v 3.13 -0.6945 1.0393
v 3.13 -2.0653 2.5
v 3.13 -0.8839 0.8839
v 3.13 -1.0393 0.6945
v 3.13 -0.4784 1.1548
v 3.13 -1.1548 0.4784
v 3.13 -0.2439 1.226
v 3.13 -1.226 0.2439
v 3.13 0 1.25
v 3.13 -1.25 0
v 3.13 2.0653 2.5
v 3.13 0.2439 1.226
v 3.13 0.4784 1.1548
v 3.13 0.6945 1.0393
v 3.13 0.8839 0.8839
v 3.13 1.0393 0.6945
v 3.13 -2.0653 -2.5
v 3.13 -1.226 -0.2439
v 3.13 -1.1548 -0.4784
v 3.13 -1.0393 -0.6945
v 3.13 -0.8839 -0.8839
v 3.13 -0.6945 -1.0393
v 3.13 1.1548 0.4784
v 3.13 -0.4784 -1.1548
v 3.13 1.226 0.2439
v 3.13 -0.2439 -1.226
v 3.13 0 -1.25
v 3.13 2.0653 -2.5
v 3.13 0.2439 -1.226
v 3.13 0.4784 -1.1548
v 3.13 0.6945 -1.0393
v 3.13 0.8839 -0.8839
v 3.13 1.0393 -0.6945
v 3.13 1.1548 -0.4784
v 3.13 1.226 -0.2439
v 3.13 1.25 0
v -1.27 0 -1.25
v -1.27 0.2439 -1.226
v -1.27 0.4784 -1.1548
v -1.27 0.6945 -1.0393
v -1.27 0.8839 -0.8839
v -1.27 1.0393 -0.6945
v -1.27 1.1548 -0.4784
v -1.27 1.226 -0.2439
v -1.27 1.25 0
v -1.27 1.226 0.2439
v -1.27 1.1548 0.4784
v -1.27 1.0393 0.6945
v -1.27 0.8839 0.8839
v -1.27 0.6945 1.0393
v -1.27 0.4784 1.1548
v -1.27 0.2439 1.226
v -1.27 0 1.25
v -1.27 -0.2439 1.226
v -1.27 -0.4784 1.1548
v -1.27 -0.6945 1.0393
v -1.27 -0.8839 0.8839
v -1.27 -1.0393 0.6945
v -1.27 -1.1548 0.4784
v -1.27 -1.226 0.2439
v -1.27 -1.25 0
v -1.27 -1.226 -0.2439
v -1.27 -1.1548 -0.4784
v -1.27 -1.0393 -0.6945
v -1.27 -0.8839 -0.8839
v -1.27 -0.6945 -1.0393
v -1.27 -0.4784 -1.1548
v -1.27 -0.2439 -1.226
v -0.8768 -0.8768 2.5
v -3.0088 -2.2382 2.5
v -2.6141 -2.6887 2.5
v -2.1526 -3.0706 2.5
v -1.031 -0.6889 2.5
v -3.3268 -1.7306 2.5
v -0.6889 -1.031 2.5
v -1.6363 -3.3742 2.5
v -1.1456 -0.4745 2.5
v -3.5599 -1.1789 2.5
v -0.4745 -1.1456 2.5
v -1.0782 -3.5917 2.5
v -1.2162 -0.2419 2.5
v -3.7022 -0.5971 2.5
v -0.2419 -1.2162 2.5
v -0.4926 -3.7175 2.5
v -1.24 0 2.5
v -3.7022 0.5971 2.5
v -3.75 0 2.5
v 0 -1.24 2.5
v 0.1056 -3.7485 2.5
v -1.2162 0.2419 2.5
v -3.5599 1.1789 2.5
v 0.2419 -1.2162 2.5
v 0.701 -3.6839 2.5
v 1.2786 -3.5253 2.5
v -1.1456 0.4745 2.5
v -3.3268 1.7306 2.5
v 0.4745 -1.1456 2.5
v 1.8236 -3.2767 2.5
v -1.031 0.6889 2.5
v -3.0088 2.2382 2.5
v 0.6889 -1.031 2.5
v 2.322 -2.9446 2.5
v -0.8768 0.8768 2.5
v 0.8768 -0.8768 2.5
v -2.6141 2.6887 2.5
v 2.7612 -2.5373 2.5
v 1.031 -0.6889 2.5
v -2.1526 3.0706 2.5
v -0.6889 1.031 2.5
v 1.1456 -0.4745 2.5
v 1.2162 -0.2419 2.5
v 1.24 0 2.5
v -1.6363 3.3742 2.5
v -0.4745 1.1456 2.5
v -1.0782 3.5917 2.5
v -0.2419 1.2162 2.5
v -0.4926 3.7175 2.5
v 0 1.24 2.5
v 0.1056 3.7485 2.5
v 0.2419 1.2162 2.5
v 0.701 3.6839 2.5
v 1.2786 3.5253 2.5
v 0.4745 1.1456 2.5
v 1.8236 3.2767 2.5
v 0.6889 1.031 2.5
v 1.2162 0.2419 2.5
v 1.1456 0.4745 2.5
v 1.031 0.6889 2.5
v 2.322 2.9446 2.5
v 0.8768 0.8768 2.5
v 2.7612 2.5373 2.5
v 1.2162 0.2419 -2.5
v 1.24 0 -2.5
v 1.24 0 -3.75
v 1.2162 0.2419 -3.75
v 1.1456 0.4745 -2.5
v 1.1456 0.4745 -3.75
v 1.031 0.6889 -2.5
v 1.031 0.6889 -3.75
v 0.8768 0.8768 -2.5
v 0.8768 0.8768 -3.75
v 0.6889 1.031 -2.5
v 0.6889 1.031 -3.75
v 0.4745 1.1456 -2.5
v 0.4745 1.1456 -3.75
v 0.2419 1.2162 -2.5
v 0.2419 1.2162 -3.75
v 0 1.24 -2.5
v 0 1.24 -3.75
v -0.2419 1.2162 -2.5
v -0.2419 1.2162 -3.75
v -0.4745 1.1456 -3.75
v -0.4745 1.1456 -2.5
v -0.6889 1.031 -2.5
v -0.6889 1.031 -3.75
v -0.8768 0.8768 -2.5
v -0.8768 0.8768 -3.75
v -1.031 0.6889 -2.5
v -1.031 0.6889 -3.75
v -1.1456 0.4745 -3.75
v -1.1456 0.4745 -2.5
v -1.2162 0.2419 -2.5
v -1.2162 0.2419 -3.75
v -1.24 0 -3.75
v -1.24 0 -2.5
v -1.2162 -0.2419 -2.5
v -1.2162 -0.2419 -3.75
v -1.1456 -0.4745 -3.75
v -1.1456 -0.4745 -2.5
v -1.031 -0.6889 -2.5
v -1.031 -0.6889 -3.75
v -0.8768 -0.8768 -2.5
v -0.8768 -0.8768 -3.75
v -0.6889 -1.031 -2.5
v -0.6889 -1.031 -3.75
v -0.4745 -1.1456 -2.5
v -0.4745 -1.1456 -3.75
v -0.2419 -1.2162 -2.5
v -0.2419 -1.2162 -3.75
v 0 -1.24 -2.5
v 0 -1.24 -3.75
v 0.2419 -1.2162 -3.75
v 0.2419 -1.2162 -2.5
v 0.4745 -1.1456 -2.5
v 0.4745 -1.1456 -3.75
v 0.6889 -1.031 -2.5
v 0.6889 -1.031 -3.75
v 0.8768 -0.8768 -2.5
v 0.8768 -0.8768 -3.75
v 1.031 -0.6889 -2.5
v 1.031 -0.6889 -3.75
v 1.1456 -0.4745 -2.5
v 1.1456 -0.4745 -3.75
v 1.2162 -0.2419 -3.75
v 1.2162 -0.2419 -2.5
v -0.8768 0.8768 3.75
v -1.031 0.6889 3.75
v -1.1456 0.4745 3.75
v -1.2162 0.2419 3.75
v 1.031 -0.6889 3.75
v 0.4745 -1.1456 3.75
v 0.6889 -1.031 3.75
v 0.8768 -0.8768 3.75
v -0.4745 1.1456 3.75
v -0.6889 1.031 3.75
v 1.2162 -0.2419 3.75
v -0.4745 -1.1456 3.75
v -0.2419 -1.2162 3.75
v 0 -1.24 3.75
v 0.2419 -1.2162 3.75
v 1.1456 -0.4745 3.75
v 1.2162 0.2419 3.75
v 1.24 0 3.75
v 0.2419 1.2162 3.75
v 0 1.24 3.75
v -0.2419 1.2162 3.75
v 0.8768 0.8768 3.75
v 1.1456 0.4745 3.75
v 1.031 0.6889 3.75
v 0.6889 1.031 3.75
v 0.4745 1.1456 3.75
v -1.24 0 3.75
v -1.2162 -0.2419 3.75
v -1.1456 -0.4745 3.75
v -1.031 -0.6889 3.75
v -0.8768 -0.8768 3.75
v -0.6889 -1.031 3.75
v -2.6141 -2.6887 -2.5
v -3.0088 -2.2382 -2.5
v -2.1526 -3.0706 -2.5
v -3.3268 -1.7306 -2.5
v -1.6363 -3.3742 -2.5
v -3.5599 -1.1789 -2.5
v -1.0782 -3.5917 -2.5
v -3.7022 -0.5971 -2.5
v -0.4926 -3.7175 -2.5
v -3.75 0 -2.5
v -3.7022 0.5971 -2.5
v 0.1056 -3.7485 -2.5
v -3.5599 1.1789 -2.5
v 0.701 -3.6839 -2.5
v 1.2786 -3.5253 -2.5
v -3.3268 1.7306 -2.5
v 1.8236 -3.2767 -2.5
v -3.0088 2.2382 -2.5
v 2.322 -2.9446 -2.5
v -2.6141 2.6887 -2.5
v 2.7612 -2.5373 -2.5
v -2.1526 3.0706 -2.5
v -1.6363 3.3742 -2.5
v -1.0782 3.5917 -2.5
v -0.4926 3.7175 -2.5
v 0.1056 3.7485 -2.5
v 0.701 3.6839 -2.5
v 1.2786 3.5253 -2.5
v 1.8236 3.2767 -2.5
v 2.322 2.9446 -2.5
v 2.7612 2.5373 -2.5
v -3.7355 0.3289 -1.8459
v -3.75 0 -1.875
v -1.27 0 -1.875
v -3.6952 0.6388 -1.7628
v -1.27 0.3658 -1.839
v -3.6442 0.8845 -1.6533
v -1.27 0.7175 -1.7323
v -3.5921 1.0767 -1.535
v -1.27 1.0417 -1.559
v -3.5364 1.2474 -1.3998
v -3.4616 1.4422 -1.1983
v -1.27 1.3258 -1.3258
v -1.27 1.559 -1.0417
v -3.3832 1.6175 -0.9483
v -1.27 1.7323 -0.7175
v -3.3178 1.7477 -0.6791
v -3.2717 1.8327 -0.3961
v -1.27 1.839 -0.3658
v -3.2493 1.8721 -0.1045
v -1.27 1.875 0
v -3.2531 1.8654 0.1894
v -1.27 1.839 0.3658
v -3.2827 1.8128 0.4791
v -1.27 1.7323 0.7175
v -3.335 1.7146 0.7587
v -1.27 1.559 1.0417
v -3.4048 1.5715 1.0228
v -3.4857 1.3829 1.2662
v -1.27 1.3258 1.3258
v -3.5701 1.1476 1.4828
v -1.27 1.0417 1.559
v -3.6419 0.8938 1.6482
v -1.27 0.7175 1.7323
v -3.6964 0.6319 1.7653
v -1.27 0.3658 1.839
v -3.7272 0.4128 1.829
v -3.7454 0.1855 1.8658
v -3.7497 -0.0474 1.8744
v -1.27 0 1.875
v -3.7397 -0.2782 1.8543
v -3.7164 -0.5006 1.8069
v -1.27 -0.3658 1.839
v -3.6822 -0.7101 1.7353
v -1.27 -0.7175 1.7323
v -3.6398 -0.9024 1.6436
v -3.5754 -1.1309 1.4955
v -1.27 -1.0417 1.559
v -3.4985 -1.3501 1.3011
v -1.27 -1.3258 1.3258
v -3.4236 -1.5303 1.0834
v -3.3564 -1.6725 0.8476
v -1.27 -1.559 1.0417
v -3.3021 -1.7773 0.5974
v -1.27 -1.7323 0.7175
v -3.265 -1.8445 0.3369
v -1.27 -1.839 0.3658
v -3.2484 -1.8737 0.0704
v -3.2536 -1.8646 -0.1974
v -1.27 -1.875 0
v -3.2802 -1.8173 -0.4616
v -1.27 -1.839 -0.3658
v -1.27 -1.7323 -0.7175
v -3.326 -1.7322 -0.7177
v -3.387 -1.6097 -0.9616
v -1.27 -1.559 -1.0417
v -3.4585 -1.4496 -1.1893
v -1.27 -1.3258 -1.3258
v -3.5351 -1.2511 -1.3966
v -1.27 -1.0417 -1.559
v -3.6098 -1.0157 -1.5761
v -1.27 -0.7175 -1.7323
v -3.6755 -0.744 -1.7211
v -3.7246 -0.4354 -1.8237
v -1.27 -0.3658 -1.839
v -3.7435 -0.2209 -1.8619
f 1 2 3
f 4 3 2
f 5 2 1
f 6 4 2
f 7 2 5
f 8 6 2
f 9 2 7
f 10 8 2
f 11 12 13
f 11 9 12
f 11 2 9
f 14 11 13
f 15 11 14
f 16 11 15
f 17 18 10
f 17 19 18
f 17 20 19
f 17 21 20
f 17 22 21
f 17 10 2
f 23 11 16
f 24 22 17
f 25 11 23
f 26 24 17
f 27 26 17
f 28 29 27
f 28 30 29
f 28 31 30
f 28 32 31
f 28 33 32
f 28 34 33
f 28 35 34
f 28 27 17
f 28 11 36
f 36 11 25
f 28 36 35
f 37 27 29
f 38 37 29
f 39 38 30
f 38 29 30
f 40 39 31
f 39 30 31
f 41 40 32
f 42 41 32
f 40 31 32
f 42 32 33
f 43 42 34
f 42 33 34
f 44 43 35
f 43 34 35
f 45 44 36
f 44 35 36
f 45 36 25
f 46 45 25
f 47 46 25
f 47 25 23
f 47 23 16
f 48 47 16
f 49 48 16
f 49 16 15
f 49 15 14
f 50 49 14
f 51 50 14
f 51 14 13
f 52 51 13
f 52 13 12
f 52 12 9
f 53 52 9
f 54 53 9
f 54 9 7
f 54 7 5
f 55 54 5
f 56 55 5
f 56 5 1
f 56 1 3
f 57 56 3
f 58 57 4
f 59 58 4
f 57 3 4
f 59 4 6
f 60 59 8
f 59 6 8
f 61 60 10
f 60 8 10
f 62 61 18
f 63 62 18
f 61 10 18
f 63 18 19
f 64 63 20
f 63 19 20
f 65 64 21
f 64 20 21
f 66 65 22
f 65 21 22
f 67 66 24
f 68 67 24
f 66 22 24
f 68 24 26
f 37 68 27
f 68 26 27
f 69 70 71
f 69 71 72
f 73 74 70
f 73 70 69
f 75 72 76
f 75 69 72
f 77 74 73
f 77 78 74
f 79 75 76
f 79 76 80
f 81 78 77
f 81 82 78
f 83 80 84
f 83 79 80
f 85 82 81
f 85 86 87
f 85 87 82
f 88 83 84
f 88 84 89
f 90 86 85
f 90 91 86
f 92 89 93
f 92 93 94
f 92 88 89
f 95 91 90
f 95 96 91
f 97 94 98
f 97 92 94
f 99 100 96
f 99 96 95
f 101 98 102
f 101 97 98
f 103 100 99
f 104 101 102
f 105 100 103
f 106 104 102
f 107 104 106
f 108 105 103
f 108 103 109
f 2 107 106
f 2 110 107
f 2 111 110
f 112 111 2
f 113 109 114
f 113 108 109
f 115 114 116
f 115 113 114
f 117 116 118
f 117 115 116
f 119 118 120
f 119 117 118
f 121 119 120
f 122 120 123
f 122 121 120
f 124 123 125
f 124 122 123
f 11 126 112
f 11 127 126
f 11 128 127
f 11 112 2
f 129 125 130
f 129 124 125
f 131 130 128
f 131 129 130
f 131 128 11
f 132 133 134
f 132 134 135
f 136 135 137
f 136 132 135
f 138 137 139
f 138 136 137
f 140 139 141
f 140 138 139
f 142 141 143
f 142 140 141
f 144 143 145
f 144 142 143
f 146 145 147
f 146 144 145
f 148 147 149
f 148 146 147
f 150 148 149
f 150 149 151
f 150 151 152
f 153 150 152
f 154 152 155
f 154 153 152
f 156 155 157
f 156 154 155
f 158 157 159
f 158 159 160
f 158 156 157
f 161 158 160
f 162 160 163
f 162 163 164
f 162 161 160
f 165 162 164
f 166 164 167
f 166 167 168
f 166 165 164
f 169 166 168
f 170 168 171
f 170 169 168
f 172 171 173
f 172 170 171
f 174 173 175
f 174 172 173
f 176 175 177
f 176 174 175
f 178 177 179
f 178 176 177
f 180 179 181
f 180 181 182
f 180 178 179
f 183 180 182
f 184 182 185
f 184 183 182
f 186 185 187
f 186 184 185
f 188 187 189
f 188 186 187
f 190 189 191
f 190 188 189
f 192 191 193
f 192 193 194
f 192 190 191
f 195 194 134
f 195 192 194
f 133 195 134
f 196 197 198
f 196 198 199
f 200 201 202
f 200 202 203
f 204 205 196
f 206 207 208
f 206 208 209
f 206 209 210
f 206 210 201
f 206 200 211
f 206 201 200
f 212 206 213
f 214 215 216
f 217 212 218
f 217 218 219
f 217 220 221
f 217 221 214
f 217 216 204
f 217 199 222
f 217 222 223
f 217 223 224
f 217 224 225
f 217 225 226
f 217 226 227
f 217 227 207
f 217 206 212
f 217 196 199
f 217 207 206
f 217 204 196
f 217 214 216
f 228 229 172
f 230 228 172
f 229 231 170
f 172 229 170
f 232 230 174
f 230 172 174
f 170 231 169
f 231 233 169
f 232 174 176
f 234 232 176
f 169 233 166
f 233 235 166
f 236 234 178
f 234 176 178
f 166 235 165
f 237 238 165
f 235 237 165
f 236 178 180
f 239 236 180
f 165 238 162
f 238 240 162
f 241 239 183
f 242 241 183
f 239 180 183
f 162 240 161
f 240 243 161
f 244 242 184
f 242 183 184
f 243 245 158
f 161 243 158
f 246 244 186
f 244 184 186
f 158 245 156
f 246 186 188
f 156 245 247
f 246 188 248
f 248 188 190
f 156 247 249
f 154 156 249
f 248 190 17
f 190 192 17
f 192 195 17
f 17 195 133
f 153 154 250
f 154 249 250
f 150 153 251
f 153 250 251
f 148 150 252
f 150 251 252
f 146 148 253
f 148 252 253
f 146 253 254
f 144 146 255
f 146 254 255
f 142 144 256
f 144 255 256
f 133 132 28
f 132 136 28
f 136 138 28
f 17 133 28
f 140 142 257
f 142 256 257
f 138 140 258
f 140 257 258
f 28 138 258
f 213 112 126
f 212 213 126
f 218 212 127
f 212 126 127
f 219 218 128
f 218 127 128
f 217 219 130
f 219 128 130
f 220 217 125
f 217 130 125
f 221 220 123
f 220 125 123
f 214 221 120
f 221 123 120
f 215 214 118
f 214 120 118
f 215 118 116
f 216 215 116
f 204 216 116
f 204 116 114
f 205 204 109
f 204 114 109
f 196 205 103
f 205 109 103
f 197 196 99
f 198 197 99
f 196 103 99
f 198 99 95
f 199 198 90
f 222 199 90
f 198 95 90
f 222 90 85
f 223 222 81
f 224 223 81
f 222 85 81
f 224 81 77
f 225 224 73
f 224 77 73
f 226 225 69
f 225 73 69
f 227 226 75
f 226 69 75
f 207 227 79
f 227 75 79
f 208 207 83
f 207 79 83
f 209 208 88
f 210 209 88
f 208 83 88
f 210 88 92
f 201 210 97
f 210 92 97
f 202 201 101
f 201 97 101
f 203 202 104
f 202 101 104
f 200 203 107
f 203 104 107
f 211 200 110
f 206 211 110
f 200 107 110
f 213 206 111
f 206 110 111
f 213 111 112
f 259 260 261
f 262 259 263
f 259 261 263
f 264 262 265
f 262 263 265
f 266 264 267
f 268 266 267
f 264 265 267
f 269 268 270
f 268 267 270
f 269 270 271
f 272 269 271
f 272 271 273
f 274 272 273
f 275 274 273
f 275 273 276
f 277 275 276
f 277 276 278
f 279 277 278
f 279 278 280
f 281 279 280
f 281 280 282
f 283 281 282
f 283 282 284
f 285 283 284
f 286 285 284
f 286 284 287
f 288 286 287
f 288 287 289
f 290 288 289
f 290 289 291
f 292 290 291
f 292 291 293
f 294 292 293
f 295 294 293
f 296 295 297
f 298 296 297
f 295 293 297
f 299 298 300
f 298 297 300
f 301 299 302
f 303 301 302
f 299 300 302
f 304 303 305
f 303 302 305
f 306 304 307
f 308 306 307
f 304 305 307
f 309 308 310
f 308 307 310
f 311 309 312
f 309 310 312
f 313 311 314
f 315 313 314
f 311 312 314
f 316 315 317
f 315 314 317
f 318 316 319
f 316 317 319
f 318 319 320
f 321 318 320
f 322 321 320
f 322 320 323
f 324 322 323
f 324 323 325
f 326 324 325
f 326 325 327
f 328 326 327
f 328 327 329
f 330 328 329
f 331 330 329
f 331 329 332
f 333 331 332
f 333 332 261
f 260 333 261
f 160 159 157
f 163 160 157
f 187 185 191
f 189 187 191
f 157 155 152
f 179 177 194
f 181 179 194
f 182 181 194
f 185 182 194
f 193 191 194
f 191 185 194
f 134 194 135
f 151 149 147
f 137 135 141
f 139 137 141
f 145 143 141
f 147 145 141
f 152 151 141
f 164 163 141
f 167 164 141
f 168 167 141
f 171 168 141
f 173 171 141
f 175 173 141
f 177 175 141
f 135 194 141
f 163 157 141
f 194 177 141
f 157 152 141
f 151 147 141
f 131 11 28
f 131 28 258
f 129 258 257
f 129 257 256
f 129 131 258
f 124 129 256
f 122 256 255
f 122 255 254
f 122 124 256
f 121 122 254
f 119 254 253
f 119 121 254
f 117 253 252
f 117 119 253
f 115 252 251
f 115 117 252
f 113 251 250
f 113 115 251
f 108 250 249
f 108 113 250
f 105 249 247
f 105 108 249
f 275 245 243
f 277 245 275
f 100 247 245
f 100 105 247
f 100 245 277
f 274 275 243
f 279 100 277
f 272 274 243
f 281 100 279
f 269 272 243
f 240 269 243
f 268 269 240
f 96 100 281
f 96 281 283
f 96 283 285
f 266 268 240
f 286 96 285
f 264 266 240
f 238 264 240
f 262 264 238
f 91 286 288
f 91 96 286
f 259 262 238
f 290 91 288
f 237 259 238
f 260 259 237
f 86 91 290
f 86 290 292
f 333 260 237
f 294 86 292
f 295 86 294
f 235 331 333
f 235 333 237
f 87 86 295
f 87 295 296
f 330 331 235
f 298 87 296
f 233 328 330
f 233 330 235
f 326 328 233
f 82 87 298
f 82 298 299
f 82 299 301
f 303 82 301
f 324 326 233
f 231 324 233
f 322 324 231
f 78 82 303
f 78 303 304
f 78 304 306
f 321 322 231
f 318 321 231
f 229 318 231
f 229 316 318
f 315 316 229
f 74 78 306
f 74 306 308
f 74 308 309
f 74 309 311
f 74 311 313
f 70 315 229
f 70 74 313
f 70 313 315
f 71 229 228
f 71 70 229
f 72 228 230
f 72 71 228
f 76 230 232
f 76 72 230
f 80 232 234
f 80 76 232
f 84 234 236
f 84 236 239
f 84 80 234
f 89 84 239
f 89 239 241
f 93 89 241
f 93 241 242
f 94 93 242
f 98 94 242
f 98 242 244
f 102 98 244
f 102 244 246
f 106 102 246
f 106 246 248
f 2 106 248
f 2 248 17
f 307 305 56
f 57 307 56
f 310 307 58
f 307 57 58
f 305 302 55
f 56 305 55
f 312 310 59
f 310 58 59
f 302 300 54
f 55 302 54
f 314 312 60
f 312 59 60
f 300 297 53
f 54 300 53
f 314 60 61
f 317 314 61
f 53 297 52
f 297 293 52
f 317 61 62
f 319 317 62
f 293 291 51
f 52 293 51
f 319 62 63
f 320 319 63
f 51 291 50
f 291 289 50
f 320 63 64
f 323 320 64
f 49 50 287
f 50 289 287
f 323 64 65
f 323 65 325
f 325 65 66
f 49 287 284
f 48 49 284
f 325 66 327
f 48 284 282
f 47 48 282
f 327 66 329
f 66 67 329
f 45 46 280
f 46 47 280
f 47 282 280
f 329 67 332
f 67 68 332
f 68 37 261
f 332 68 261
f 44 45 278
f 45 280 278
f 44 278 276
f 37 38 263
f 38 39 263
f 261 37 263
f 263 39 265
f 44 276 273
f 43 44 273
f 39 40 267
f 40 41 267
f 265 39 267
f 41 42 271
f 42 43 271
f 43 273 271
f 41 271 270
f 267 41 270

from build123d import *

# Parameters (mm, degrees)
BOSS_EXTRUDE1_DEPTH = 2.5
SKETCH4_R           = 1.24
BOSS_EXTRUDE2_DEPTH = 1.25
SKETCH5_R           = 1.25
CUT_EXTRUDE2_DEPTH  = 7.88
SKETCH7_R           = 1.875
CUT_EXTRUDE3_DEPTH  = 8.25
SKETCH8_R           = 1.875
BOSS_EXTRUDE3_DEPTH = 4.4
SKETCH5_3_R         = 1.25
CUT_EXTRUDE4_DEPTH  = 7.8800001


with BuildPart() as part:
    # Sketch3 → Boss-Extrude1 (new body, symmetric)
    with BuildSketch(Plane.XY):
        with BuildLine():
            Line((3.13, -2.065332903), (3.13, 2.065332903))
            ThreePointArc((3.13, 2.065332903), (-3.75, 0), (3.13, -2.065332903))
        make_face()
    extrude(amount=BOSS_EXTRUDE1_DEPTH, both=True)

    # Sketch4 → Boss-Extrude2 (add)
    with BuildSketch(Plane.XY.offset(2.5)):
        Circle(SKETCH4_R)
    boss_extrude2 = extrude(amount=BOSS_EXTRUDE2_DEPTH)

    # Mirror1: Boss-Extrude2 across plane
    add(boss_extrude2.mirror(Plane.XY))

    # Sketch5 → Cut-Extrude2 (cut, through all)
    with BuildSketch(Plane(origin=(3.13, 0, 0), x_dir=(0, 0, -1), z_dir=(1, 0, 0))):
        Circle(SKETCH5_R)
    extrude(amount=-CUT_EXTRUDE2_DEPTH, mode=Mode.SUBTRACT)

    # Sketch7 → Cut-Extrude3 (cut)
    with BuildSketch(Plane(origin=(3.13, 0, 0), x_dir=(0, 0, -1), z_dir=(1, 0, 0))):
        Circle(SKETCH7_R)
    extrude(amount=-CUT_EXTRUDE3_DEPTH, mode=Mode.SUBTRACT)

    # Sketch8 → Boss-Extrude3 (add)
    with BuildSketch(Plane(origin=(3.13, 0, 0), x_dir=(0, 0, -1), z_dir=(1, 0, 0))):
        Circle(SKETCH8_R)
    extrude(amount=-BOSS_EXTRUDE3_DEPTH)

    # Sketch5<3> → Cut-Extrude4 (cut, through all)
    with BuildSketch(Plane(origin=(3.13, 0, 0), x_dir=(0, 0, -1), z_dir=(1, 0, 0))):
        Circle(SKETCH5_3_R)
    extrude(amount=-CUT_EXTRUDE4_DEPTH, mode=Mode.SUBTRACT)


solid = part.part
